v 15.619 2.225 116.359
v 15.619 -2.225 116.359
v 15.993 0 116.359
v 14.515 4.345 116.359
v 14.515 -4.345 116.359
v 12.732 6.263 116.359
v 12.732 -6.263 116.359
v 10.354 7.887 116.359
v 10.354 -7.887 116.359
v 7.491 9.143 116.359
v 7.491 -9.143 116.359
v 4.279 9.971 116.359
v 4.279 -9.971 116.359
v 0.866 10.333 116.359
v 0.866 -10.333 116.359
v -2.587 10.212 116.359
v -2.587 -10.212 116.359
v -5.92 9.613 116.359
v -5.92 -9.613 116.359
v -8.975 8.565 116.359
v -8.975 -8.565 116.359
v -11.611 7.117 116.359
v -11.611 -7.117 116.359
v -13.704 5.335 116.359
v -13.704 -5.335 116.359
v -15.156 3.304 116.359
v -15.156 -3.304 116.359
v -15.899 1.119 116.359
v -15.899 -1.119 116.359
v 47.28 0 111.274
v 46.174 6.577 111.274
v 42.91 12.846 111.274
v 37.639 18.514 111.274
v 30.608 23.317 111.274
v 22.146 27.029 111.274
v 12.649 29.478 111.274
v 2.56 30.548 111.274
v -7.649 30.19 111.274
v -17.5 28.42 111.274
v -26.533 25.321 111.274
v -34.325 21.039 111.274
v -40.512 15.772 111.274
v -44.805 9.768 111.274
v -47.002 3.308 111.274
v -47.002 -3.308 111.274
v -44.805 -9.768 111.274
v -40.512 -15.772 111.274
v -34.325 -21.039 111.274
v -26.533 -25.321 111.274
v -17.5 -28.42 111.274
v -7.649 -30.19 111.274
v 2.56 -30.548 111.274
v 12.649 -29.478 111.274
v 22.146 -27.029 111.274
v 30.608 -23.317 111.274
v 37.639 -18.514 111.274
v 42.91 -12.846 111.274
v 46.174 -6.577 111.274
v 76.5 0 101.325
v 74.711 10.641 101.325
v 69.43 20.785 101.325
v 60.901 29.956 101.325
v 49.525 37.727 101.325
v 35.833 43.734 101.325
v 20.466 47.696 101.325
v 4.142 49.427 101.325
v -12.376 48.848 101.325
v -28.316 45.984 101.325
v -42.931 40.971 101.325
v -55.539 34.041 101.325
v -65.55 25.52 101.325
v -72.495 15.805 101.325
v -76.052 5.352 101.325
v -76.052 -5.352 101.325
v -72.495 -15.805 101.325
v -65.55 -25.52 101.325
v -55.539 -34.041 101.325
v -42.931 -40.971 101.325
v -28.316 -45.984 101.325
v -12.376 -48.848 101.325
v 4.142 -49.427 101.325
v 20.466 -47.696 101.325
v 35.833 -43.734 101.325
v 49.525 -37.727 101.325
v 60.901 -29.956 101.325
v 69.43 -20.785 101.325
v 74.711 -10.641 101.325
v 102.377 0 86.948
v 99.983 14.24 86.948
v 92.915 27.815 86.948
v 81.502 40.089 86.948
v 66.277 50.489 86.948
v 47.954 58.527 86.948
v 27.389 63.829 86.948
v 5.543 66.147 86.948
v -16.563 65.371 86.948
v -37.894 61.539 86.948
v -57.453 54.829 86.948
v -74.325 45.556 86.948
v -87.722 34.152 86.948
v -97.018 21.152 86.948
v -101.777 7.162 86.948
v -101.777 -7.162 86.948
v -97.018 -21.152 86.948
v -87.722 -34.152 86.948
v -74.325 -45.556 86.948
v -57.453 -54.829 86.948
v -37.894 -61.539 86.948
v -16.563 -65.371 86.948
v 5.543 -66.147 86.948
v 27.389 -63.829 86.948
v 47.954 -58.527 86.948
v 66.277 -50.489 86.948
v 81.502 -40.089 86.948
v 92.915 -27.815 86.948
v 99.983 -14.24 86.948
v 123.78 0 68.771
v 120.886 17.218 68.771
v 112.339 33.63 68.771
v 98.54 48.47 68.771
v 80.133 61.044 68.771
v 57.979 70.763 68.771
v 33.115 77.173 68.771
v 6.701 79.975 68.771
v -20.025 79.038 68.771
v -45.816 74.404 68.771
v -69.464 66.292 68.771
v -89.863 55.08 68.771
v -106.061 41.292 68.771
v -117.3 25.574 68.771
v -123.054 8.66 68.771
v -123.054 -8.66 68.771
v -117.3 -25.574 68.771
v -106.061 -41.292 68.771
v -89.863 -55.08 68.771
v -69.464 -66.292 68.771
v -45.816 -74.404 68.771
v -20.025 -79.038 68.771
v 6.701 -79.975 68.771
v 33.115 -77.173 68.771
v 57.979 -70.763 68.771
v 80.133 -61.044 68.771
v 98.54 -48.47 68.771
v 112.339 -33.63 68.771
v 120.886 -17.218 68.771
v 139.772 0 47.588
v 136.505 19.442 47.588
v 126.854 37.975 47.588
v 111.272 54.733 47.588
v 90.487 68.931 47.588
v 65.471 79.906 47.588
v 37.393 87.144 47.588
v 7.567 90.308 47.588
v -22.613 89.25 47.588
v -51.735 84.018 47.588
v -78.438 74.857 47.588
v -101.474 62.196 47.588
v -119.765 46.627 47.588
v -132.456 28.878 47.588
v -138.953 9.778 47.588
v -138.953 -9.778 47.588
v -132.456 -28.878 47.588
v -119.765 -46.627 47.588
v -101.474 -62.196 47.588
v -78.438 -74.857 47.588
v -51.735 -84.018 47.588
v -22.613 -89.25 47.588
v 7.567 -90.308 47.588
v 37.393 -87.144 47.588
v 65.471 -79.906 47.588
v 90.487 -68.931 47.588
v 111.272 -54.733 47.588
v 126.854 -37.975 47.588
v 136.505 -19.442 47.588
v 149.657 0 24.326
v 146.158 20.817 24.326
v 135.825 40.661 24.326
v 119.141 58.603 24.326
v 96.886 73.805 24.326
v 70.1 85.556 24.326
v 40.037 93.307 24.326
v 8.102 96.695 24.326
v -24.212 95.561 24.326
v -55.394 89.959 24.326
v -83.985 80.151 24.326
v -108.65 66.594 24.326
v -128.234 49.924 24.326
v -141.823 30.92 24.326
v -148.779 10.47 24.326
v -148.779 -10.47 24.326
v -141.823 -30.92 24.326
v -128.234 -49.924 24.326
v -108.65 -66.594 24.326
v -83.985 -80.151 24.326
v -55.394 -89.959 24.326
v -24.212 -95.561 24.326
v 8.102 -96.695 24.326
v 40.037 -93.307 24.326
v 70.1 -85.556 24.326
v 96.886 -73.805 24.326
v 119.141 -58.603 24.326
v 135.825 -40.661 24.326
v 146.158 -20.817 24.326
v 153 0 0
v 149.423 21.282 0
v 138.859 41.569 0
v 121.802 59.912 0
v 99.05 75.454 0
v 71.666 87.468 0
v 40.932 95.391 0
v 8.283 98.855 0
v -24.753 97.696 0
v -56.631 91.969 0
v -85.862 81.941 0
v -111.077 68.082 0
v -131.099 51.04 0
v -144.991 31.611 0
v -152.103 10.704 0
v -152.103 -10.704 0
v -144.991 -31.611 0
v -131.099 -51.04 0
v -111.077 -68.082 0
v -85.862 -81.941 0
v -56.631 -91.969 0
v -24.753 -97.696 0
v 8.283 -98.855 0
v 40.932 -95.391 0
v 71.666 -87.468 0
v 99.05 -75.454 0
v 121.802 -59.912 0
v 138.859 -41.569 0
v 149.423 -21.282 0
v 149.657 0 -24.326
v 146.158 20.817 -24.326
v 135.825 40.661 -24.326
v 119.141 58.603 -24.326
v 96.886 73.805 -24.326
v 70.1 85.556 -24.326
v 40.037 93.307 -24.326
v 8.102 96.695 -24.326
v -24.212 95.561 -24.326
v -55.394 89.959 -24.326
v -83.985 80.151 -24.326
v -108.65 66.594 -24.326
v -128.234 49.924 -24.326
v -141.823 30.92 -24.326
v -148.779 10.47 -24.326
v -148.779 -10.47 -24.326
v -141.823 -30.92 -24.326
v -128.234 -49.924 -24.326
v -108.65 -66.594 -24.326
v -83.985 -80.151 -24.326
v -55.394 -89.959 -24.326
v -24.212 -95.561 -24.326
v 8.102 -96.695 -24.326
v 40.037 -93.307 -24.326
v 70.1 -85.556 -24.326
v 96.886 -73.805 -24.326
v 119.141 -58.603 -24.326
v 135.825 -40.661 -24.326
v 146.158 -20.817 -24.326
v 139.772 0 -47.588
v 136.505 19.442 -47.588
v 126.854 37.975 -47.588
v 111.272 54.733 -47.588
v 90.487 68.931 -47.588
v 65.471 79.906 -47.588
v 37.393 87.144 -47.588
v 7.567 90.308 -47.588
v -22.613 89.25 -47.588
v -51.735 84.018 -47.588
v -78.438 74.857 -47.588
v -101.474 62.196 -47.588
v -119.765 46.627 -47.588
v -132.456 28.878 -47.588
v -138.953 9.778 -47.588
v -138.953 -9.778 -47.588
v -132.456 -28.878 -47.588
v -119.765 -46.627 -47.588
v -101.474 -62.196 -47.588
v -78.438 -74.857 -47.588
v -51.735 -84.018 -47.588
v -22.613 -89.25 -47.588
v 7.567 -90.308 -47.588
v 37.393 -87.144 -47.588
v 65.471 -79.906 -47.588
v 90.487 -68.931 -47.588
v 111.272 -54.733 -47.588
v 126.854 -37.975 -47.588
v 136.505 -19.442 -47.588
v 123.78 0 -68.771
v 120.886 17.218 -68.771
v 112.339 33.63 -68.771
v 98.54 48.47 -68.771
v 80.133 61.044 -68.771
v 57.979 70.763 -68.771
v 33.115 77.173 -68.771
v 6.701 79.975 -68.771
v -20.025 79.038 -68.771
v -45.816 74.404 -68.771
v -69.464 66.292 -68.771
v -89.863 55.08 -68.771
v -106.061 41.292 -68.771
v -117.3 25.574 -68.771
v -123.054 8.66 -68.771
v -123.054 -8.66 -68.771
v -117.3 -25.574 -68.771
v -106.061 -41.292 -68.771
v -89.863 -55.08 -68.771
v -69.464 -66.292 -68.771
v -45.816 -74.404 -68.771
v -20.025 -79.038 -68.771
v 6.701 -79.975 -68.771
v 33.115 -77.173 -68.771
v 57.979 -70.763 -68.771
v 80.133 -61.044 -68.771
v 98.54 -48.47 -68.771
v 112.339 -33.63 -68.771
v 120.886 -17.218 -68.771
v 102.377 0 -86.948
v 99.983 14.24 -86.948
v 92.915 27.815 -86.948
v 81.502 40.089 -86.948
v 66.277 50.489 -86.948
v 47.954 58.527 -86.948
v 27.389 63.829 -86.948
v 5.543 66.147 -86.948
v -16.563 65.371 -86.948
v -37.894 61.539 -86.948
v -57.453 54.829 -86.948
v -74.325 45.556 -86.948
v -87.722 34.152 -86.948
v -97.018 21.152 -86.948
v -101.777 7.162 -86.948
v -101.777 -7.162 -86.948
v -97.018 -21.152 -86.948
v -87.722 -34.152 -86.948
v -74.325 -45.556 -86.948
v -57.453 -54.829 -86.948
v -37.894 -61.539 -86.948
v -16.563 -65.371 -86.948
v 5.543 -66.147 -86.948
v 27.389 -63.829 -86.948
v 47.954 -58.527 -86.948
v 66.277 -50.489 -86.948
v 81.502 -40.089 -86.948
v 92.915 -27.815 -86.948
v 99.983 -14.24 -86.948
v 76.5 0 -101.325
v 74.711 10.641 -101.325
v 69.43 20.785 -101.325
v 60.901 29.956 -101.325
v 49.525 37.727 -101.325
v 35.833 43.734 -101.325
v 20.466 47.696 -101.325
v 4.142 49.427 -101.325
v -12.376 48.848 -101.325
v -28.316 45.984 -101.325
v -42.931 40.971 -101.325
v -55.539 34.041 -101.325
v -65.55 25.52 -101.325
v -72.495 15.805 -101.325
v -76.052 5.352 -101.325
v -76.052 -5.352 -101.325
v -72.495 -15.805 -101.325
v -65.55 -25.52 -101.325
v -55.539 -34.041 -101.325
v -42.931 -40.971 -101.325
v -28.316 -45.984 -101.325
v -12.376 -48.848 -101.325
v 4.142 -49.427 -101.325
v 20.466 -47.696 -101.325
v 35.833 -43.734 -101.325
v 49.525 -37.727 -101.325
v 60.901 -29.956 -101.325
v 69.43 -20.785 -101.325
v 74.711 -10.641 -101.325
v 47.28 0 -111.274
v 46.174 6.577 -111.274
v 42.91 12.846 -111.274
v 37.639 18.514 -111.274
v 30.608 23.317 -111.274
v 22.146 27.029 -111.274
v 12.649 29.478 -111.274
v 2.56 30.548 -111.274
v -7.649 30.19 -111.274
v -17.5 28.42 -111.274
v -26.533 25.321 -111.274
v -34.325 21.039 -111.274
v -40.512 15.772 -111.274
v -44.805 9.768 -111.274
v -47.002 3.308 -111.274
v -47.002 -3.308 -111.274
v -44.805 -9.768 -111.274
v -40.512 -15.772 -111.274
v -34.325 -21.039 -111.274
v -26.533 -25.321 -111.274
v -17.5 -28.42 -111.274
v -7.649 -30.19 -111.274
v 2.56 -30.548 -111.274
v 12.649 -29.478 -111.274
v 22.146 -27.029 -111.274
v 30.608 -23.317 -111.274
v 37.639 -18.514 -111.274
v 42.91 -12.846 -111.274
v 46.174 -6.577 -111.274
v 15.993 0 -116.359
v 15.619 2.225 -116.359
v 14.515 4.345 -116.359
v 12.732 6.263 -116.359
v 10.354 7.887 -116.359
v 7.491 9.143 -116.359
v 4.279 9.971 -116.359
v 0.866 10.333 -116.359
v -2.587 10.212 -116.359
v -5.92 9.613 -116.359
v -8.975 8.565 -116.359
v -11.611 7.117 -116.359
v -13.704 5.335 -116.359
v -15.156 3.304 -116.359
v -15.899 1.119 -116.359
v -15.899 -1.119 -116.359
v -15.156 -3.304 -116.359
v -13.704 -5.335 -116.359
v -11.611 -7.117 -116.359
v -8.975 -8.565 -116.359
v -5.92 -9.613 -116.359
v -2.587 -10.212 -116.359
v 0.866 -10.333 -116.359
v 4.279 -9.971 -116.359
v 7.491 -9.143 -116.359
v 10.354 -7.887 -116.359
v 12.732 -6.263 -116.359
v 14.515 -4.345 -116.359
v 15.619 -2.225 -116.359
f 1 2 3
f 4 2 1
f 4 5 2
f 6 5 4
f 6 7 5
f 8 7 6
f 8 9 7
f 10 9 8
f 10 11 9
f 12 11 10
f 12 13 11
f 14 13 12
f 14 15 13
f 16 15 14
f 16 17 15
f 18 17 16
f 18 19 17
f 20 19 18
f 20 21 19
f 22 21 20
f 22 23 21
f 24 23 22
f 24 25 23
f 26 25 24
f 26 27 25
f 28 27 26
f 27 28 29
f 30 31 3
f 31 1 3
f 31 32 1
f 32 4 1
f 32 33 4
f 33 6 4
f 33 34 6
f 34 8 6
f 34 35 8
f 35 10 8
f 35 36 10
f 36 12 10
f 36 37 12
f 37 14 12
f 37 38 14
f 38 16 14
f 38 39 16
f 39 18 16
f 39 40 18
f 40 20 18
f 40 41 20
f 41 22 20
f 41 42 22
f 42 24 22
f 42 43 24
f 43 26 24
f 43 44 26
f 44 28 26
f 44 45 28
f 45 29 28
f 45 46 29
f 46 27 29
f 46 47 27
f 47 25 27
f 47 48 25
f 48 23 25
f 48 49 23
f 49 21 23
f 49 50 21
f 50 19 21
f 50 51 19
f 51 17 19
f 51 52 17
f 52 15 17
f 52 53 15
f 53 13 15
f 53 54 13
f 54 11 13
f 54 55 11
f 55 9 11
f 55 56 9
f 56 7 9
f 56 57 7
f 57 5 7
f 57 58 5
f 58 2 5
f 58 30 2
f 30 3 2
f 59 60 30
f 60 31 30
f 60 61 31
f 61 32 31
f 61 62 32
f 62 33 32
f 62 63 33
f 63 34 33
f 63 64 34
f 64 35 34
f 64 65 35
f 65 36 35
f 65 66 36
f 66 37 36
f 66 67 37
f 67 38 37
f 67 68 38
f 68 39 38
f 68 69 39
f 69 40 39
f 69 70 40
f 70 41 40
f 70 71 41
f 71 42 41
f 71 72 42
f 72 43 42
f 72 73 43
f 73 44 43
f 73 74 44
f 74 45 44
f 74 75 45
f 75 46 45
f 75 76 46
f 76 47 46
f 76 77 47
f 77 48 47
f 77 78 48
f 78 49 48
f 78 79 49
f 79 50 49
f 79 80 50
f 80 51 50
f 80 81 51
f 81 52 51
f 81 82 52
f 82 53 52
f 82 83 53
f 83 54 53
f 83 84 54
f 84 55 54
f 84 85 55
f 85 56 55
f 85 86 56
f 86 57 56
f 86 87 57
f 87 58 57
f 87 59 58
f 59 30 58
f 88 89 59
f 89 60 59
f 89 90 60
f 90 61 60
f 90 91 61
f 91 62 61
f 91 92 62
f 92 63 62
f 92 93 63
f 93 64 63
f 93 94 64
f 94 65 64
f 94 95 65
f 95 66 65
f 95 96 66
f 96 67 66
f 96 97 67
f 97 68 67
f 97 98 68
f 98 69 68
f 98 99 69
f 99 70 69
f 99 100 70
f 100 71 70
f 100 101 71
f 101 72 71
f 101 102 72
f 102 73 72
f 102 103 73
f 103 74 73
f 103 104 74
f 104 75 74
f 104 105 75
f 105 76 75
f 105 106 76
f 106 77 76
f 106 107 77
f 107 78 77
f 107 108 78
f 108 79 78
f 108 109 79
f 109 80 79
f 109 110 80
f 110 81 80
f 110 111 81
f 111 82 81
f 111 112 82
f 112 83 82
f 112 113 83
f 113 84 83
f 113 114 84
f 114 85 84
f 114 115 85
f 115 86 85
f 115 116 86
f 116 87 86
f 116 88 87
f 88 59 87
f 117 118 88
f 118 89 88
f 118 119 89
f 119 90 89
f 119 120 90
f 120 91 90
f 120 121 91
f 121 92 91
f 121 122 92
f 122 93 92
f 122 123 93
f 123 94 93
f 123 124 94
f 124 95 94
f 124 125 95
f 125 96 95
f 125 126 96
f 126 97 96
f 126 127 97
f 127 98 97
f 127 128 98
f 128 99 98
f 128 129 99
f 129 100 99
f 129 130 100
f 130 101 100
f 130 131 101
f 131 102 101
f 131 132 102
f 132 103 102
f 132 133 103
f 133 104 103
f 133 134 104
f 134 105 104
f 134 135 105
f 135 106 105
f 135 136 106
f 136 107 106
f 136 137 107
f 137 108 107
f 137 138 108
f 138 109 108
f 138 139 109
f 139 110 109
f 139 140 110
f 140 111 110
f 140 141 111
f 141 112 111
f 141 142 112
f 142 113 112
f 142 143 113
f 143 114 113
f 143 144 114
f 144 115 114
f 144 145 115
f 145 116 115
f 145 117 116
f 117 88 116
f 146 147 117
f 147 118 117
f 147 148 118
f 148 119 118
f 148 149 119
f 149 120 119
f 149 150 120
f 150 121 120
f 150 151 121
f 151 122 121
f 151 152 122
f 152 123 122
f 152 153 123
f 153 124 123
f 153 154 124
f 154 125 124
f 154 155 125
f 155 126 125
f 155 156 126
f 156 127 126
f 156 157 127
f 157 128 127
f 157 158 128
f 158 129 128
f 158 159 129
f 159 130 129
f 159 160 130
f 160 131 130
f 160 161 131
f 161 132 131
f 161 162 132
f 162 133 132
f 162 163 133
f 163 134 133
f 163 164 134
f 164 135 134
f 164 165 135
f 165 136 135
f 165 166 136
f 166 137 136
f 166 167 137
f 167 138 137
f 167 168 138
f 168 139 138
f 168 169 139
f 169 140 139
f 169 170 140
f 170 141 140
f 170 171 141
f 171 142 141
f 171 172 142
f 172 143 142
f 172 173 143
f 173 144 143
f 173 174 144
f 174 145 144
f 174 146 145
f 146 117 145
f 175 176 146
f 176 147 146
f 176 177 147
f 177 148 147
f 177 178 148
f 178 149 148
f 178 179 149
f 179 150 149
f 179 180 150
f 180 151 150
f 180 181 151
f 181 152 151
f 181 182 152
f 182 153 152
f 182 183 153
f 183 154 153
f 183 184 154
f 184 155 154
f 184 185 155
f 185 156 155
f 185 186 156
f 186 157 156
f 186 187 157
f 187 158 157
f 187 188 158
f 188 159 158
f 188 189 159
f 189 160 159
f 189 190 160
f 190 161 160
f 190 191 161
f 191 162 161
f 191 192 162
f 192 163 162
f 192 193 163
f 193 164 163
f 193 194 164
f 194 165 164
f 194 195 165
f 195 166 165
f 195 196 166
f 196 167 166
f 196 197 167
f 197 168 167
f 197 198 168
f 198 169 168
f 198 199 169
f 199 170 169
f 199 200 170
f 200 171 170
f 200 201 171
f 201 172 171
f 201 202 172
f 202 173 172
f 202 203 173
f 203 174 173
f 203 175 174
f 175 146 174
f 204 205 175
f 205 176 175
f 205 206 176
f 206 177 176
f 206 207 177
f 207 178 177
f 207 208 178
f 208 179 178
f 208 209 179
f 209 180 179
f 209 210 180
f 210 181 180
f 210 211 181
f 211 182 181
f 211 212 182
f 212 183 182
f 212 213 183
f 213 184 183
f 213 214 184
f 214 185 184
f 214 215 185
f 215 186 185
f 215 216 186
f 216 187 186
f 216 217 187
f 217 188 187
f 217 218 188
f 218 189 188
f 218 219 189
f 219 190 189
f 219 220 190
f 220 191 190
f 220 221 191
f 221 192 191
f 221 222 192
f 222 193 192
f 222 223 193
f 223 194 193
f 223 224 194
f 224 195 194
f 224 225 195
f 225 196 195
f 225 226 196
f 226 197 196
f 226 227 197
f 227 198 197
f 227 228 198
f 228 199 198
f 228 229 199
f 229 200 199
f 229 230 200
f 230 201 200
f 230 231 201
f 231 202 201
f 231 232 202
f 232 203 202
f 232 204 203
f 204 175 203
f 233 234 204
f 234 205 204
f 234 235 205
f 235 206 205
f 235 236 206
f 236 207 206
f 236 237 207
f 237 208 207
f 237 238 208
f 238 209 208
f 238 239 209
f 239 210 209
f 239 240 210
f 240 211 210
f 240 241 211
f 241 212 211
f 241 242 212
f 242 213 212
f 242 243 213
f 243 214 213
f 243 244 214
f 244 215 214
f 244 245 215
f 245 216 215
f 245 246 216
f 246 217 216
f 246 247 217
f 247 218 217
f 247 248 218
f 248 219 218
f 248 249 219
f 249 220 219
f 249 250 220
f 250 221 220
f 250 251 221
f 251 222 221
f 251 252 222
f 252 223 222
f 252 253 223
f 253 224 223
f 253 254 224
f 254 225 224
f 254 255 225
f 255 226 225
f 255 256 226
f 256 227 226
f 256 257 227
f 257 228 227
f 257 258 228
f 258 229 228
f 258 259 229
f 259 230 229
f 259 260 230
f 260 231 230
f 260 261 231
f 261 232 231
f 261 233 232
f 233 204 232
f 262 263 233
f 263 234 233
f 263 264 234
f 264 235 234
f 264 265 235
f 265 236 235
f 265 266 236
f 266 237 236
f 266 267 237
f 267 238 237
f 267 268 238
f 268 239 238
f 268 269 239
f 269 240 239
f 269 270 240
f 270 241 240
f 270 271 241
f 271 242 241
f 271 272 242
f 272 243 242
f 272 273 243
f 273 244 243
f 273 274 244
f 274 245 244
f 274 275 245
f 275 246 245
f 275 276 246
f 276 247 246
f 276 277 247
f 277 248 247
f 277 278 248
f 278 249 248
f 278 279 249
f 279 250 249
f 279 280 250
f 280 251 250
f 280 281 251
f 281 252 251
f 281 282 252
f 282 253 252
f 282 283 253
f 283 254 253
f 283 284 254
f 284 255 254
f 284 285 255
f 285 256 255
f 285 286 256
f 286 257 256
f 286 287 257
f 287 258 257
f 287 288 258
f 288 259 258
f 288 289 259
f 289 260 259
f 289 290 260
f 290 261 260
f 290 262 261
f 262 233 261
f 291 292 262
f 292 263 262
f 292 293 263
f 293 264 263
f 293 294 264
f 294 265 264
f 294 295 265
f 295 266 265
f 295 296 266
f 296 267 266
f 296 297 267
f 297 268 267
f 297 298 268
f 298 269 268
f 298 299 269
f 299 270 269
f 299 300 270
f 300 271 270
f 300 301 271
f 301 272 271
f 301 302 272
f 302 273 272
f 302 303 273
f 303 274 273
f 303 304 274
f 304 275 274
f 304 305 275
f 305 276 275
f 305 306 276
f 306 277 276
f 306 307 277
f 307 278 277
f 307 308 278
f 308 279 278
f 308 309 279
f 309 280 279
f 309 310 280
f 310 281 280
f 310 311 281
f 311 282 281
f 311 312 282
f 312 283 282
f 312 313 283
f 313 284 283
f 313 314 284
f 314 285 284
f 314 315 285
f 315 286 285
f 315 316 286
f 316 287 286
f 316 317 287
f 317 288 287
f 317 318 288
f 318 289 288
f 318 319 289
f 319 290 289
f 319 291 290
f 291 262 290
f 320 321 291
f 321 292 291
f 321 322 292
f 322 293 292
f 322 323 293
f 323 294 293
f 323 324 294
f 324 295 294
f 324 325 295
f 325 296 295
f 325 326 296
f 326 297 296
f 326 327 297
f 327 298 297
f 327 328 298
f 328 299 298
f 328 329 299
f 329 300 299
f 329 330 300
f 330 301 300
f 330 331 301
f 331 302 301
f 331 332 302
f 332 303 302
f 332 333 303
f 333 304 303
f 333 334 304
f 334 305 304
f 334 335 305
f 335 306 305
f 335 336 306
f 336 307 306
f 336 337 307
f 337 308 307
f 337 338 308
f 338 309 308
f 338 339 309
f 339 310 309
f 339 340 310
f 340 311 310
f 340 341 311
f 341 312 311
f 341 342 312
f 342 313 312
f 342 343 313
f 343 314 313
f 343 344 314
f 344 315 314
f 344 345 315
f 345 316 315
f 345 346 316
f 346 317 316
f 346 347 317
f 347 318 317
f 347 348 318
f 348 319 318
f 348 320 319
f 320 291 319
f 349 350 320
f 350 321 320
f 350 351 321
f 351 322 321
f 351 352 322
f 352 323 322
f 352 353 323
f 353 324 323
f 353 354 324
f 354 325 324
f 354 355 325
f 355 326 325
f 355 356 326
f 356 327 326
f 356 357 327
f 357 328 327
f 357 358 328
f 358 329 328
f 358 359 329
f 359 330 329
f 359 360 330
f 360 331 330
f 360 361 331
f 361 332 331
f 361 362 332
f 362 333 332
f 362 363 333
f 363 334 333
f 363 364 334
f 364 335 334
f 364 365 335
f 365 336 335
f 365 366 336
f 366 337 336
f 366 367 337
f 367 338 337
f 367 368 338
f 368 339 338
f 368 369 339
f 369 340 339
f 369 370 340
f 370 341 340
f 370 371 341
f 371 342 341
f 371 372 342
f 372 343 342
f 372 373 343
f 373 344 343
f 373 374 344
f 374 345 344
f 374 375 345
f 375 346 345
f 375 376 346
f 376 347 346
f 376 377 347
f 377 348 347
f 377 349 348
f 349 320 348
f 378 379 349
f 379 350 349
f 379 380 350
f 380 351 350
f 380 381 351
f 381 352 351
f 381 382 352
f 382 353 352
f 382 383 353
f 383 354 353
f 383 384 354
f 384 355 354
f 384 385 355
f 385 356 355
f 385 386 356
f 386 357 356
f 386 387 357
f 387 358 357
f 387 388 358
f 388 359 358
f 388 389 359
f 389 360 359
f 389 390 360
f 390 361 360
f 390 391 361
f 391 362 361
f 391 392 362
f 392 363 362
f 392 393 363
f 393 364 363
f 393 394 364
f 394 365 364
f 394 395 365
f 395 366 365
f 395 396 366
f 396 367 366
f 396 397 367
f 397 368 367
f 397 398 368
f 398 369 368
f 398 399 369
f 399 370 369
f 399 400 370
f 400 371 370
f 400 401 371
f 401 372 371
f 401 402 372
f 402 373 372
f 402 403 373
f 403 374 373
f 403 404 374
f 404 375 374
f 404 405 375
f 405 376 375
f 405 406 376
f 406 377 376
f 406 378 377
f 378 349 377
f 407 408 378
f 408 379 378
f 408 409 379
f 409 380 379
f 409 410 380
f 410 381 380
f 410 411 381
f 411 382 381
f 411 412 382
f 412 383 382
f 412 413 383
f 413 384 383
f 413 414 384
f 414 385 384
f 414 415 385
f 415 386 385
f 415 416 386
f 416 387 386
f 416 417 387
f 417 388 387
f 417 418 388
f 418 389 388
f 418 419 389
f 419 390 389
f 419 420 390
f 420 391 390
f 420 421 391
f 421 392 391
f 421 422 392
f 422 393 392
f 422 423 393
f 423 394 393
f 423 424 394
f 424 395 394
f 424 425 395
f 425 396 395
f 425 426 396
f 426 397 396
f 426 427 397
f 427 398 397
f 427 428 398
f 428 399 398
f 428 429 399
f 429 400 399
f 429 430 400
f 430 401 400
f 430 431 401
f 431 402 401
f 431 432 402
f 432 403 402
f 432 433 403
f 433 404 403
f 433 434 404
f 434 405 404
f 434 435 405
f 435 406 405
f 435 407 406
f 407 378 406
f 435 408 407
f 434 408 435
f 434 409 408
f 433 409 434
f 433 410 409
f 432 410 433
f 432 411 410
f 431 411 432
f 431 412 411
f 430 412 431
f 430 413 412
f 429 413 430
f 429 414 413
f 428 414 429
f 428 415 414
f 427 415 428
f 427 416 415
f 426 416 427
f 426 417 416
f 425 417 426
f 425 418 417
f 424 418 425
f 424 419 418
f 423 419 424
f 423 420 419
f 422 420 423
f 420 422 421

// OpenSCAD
// Generated by SolidPython 1.0.1 on 2020-07-29 00:46:53


scale(v = [17, 11, 13]) {
	sphere(r = 9);
}
/***********************************************
*********      SolidPython code:      **********
************************************************
 
# import packages: SolidPython
from solid import *
from solid.utils import *
from itertools import chain, combinations, permutations


class Resize:

    def __init__(self, scad_file):
        self.scad_file = scad_file
        #self.scad_file = import_scad(scad_file)
        # cone/cylinder param:
        self.r1 = 0
        self.r2 = 0
        self.h = 0
        # rectangular prism param:
        self.w = 0
        self.l = 0
        # ellipse param:
        self.r = 0

    # import OpenScad code (file name corresponds to shape)


    # classify shape + parameters
    def assign(self, param1, param2, param3):
        if self.scad_file == 'cone.scad':
            self.r1 = param1
            self.r2 = param2
            self.h = param3
        elif self.scad_file == 'cylinder.scad':
            self.r1 = param1
            self.r2 = param2
            self.h = param3
        elif self.scad_file == 'rectangularPrism.scad':
            self.h = param1
            self.l = param2
            self.w = param3
        else:
            self.r = param1
            self.h = param2

    # resize parameters
    def iterate(self):
        x = range(3, 20, 2)
        i = 1
        if self.scad_file == 'cone.scad':
            tempList = list(permutations(x, 2))
            for temp in tempList:
                param1 = temp[0]
                param2 = temp[1]
                filepath = 'produced_scad_files/' + 'cone' + str(param1) + '_' + str(param2) + '_' + '.scad'
                scad_render_to_file(cylinder(h=param1, r1=param2, r2=0), filepath)

        elif self.scad_file == 'cylinder.scad':
            tempList = list(permutations(x, 3))
            for temp in tempList:
                param1 = temp[0]
                param2 = temp[1]
                filepath = 'produced_scad_files/' + 'cylinder' + str(param1) + '_' + str(param2) + '_' + '.scad'
                scad_render_to_file(cylinder(h=param1, r1=param2, r2=param2), filepath)

        elif self.scad_file == 'rectangularPrism.scad':
            tempList = list(permutations(x, 3))
            for temp in tempList:
                param1 = temp[0]
                param2 = temp[1]
                param3 = temp[2]
                filepath = 'produced_scad_files/' + 'rectangularPrism' + str(param1) + '_' + str(param2) + '_' + str(
                    param3) + '.scad'
                scad_render_to_file(cube(size=(param1, param2, param3)), filepath)

        elif self.scad_file == 'ellipse.scad':
            tempList = list(permutations(x, 4))
            for temp in tempList:
                param1 = temp[0]
                param2 = temp[1]
                param3 = temp[2]
                param4 = temp[3]
                filepath = 'produced_scad_files/' + 'ellipse' + str(param1) + '_' + str(param2) + '_' + str(param3) + '_' + str(param4) + '.scad'
                scad_render_to_file(scale([param1, param2, param3])(sphere(r=param4)), filepath)

    def render_to_scadfile(self):
        scad_render_to_file(scad, 'example.scad') 
 
************************************************/
